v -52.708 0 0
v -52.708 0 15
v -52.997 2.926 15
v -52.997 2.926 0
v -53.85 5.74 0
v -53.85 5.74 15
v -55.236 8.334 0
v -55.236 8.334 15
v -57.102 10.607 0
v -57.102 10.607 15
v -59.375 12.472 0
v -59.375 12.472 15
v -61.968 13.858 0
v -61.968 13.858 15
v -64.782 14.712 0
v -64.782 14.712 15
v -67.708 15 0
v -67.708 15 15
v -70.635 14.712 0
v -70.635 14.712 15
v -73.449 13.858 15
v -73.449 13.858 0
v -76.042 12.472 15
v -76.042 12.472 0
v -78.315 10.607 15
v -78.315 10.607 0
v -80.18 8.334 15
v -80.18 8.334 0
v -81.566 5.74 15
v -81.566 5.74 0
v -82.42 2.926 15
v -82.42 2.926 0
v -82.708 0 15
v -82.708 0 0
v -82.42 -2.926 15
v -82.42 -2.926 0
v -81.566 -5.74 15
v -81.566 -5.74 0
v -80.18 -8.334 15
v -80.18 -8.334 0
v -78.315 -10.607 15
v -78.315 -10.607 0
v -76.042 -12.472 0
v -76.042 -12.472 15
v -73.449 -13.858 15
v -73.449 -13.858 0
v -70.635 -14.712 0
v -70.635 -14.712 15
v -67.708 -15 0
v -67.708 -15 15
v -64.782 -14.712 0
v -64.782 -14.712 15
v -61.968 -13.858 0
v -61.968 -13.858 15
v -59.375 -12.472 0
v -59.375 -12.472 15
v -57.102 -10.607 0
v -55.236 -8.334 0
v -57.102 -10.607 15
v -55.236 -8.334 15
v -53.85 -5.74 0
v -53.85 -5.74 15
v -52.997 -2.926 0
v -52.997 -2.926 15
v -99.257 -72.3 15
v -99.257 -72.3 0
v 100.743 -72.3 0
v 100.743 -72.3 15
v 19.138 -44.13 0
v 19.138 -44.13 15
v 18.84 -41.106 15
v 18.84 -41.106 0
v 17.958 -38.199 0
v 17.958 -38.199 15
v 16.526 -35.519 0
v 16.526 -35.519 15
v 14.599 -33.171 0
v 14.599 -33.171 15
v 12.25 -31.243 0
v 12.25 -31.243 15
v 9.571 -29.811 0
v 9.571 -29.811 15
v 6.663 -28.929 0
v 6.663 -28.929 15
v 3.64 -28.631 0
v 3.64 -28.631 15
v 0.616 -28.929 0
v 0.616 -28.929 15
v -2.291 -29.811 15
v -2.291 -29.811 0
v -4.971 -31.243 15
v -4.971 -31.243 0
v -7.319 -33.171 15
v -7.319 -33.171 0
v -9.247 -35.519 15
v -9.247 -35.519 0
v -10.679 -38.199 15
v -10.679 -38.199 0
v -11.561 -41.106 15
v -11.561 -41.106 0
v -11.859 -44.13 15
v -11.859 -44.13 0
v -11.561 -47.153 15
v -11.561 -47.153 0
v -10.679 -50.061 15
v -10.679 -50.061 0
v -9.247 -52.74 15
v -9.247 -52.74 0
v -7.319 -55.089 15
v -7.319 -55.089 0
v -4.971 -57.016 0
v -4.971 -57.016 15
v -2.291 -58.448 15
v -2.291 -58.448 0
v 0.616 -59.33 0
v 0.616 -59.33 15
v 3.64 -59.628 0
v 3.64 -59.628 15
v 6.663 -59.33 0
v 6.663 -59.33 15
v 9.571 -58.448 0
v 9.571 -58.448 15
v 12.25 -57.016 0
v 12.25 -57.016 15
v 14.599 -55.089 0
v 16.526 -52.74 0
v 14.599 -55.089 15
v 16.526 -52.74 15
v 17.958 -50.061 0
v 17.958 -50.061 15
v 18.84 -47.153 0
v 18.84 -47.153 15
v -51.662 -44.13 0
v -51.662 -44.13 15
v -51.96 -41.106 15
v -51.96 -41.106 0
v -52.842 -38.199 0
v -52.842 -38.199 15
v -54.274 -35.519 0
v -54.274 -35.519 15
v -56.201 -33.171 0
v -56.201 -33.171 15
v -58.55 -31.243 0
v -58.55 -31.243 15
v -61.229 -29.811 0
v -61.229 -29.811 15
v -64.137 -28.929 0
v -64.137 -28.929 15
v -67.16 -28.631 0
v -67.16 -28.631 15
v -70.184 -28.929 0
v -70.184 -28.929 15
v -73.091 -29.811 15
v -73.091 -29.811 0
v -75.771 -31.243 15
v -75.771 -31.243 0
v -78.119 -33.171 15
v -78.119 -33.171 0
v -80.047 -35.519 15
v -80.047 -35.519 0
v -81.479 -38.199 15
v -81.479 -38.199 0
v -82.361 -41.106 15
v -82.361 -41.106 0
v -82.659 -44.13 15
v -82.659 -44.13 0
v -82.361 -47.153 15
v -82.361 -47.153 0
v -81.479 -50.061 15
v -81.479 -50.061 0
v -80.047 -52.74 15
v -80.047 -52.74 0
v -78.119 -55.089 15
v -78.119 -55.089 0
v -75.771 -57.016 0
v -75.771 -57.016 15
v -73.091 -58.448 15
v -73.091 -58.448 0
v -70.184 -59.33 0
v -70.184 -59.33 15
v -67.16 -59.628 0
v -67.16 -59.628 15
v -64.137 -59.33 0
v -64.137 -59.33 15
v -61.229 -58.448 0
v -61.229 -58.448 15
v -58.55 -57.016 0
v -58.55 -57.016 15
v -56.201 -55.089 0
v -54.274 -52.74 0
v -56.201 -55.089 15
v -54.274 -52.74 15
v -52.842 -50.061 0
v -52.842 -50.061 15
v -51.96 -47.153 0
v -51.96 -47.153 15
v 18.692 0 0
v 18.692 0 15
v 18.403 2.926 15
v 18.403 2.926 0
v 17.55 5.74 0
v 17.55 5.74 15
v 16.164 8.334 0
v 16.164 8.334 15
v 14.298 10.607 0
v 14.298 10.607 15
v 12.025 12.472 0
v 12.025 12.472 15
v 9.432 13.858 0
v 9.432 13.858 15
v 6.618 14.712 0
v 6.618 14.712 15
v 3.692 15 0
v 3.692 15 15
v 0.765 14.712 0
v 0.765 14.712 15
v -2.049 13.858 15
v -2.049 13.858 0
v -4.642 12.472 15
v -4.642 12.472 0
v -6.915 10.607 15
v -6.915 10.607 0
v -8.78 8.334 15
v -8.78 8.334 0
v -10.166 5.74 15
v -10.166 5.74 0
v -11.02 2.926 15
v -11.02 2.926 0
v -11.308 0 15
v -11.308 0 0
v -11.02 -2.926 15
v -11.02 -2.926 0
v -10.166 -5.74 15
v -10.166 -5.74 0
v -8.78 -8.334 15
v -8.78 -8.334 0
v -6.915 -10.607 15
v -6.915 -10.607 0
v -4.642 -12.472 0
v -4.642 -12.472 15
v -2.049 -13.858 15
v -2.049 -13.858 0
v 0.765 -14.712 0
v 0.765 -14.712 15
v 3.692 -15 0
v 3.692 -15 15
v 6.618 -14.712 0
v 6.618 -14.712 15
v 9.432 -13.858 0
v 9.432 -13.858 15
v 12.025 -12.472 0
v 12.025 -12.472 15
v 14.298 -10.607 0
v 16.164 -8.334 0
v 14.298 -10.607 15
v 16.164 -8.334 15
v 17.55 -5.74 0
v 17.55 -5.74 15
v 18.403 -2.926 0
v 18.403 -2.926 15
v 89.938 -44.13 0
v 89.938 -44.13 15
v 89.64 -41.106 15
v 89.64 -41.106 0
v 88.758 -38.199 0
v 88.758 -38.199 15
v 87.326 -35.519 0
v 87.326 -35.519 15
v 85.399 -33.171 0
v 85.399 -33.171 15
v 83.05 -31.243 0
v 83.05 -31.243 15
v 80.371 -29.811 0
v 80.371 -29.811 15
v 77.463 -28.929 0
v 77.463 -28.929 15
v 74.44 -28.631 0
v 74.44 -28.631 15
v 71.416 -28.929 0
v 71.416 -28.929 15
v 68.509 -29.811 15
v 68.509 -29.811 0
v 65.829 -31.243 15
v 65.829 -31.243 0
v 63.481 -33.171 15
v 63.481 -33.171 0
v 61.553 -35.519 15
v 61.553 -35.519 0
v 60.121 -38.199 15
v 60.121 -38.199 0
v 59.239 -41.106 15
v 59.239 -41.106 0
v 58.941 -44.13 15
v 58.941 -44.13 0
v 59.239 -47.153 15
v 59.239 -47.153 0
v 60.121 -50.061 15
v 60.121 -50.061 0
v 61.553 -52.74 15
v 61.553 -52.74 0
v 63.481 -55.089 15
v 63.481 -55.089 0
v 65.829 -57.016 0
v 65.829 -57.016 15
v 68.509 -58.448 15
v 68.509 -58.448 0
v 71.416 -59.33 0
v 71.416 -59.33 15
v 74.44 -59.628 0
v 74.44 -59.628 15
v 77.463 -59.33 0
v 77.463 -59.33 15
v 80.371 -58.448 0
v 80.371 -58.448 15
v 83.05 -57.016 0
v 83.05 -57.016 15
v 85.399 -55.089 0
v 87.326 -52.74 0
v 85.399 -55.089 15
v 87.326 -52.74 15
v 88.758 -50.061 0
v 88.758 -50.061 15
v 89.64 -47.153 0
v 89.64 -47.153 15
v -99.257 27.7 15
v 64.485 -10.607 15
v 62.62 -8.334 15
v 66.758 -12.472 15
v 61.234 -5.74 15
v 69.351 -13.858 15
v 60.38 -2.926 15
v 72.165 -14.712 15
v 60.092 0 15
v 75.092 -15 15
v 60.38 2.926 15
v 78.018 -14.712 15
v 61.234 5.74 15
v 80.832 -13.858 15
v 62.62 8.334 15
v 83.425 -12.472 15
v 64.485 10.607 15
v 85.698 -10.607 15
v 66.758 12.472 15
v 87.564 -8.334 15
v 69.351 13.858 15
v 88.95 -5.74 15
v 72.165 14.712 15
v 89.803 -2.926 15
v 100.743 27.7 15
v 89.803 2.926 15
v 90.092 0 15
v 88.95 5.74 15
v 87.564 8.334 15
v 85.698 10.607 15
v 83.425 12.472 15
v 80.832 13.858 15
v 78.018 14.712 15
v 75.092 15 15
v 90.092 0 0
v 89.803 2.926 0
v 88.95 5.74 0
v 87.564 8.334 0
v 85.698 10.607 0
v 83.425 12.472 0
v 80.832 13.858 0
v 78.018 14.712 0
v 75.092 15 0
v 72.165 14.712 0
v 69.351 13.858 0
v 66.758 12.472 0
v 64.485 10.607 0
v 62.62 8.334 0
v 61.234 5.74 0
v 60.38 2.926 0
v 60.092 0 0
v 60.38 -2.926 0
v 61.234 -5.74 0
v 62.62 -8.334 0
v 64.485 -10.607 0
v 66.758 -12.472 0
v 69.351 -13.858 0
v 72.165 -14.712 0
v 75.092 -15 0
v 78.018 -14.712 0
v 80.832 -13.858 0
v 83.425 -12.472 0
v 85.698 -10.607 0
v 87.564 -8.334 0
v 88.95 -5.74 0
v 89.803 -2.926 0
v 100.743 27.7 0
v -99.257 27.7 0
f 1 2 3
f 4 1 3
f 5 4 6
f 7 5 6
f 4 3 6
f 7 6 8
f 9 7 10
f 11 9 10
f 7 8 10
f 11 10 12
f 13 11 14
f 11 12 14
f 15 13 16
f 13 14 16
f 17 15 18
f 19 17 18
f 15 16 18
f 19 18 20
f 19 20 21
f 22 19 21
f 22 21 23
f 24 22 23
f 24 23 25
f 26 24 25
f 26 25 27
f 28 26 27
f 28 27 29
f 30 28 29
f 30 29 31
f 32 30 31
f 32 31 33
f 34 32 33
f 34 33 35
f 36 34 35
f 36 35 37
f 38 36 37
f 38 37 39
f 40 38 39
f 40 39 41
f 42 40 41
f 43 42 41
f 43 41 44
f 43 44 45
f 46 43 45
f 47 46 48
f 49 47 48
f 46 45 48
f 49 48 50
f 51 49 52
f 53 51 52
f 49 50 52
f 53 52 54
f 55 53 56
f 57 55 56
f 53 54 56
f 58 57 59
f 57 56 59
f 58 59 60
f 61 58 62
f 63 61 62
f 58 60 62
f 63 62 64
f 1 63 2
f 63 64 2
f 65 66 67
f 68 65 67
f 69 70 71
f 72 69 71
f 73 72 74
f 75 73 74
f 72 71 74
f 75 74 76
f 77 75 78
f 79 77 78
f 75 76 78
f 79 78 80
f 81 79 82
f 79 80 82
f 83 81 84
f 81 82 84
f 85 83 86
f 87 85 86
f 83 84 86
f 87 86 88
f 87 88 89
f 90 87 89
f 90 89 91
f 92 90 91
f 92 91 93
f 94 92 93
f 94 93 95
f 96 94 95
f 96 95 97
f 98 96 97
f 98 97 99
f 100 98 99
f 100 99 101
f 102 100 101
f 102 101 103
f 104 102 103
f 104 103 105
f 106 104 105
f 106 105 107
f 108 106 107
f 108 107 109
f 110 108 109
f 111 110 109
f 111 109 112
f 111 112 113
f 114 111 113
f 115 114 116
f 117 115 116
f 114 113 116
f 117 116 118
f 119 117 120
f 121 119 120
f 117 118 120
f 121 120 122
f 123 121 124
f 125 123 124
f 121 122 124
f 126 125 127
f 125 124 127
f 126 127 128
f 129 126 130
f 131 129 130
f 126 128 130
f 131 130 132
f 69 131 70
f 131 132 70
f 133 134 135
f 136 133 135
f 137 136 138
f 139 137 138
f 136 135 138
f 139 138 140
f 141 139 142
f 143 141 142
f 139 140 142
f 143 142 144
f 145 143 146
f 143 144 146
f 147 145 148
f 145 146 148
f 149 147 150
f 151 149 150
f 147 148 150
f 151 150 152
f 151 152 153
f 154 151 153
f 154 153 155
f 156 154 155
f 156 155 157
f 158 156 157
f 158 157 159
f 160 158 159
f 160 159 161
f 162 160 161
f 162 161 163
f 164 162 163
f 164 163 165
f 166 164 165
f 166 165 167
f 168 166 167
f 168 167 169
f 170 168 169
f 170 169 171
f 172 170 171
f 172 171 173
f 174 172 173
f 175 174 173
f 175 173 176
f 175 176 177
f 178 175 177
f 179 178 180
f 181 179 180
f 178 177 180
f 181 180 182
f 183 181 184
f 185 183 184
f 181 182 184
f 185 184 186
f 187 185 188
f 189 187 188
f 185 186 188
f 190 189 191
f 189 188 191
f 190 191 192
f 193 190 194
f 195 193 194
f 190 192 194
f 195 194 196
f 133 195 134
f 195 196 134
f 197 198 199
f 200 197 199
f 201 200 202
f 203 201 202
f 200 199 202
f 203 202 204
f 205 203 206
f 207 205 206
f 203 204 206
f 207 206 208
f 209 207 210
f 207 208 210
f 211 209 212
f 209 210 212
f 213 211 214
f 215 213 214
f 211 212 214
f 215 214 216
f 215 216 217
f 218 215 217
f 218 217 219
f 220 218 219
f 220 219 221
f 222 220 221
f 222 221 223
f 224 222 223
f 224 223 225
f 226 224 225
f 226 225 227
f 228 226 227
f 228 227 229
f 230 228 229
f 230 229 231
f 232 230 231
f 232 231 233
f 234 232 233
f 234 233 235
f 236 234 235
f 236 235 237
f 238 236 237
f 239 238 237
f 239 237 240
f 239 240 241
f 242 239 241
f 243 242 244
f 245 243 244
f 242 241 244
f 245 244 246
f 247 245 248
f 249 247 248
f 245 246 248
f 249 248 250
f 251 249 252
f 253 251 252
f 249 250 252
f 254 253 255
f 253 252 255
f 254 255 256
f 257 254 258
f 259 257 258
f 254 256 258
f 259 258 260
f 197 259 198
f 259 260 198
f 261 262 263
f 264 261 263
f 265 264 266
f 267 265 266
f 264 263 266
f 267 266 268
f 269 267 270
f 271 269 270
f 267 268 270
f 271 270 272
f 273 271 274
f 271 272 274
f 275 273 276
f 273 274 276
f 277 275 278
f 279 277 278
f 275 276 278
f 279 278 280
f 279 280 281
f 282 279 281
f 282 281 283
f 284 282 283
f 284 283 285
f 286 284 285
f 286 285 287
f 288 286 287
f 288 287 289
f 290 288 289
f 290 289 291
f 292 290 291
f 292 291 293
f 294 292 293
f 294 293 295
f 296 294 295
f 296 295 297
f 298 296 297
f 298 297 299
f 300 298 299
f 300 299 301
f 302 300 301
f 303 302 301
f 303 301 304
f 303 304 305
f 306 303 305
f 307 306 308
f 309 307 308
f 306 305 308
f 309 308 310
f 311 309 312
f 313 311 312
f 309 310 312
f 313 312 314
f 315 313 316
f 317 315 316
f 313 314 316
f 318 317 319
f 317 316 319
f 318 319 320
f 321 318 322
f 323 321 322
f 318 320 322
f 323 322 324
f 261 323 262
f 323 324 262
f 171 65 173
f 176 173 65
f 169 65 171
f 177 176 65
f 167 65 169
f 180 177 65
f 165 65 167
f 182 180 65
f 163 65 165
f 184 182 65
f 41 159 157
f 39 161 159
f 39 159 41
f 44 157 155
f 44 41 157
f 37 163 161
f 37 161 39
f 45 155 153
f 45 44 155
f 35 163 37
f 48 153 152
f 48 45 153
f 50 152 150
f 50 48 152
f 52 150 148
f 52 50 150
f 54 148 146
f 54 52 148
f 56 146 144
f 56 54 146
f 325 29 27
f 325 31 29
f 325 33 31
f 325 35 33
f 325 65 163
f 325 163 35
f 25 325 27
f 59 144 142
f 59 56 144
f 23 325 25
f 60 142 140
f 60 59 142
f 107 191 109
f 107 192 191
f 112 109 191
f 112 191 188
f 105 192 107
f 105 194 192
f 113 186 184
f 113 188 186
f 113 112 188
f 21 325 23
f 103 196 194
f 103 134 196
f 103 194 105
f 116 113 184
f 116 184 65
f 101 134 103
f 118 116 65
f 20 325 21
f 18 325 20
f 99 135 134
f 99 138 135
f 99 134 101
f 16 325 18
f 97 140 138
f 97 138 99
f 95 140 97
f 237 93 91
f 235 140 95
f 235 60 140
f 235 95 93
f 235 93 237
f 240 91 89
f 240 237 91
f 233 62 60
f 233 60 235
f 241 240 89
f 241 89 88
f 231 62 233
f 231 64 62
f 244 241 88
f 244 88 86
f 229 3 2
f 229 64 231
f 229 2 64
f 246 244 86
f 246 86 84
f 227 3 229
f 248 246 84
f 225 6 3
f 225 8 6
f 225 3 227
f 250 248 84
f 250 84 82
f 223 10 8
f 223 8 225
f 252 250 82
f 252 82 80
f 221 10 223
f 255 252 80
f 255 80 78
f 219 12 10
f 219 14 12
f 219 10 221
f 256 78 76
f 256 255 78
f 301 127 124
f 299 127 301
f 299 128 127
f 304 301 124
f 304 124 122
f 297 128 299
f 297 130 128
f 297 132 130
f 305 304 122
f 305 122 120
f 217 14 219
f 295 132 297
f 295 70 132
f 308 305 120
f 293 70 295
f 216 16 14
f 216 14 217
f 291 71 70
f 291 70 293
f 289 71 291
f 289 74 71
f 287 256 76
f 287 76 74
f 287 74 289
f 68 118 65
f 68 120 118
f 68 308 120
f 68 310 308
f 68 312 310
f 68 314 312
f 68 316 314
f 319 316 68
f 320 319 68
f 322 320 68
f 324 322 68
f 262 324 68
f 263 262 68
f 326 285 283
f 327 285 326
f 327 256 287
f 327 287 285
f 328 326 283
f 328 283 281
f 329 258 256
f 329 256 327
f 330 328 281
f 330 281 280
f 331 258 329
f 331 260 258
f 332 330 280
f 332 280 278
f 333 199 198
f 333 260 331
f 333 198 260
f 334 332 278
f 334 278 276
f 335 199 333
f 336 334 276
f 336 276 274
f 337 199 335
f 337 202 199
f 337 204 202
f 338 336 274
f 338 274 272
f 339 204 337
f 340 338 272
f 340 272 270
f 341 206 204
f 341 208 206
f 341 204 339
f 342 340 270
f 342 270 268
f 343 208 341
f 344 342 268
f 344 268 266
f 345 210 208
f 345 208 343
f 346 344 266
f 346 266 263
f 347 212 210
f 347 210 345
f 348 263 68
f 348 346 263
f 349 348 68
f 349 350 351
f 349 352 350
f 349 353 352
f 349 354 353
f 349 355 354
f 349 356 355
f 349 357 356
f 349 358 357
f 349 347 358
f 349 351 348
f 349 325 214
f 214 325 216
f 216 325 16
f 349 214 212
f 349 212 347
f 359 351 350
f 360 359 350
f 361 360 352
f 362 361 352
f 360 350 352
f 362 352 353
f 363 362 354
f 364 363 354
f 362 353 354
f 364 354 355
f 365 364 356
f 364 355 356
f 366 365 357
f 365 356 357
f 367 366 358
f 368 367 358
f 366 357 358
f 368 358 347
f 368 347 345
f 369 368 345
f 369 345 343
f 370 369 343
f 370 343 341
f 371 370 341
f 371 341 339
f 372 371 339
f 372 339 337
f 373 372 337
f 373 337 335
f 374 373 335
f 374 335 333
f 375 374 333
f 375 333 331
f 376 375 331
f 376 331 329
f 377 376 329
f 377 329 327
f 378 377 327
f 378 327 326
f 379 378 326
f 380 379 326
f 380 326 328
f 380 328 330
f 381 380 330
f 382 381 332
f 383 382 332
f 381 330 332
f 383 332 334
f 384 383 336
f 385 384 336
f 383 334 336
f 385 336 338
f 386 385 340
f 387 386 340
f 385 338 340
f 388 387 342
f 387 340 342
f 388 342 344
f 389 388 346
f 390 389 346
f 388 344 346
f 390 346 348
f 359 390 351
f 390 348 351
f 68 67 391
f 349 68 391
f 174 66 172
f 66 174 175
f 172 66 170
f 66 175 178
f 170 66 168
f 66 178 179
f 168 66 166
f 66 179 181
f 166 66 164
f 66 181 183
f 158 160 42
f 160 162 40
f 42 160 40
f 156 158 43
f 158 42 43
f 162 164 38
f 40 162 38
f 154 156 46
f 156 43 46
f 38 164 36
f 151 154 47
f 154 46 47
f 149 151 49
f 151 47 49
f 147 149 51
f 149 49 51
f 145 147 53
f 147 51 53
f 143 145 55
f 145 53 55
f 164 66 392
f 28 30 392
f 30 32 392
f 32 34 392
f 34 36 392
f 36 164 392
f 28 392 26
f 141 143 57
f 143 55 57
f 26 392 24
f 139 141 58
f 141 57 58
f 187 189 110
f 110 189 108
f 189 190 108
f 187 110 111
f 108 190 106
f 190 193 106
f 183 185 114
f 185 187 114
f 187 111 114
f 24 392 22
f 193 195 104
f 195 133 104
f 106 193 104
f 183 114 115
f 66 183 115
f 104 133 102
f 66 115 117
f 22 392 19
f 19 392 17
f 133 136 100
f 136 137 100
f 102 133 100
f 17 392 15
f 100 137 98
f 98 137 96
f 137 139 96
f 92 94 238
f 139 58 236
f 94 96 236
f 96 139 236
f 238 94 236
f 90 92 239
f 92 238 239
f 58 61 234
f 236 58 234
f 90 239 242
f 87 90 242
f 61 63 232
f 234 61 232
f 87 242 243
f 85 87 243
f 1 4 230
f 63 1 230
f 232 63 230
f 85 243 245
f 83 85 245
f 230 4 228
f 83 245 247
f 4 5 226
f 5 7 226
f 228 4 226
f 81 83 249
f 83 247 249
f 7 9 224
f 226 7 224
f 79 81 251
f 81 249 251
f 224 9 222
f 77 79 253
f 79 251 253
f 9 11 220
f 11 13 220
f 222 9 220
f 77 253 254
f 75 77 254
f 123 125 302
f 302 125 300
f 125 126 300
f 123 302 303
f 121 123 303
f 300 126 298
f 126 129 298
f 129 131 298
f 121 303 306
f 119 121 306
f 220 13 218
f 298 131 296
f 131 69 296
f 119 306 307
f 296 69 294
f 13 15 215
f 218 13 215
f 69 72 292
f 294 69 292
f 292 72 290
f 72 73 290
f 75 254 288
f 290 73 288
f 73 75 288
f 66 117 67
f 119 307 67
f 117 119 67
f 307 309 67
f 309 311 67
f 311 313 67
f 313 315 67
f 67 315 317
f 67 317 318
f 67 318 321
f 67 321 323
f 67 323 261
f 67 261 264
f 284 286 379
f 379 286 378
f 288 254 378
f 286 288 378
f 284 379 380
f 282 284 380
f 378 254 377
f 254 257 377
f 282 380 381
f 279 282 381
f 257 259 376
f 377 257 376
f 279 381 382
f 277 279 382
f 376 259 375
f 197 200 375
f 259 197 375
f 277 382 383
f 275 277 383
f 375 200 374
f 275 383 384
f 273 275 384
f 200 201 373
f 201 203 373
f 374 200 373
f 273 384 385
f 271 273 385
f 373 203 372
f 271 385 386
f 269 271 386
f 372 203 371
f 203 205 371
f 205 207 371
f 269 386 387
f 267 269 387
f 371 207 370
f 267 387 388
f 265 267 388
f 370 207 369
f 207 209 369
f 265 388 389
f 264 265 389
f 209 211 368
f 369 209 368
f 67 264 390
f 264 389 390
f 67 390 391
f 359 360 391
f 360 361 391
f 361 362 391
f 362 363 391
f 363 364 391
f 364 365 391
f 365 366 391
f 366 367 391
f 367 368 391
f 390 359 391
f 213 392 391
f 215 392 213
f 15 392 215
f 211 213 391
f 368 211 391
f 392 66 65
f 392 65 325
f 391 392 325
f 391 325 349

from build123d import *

# Parameters (mm, degrees)
F0_W     = 200
F0_H     = 100
F1_DEPTH = 15
F2_R     = 15
F3_DEPTH = 15.001
F4_R     = 15.498481
F5_DEPTH = 15.001
F6_DEPTH = 15.001


with BuildPart() as f1:
    # F0 (on Top) → F1 (new body)
    with BuildSketch(Plane.XY):
        with Locations((0.742927, -22.300308)):
            Rectangle(F0_W, F0_H)
    extrude(amount=F1_DEPTH)

    # F2 (on face) → F3 (cut, through all)
    with BuildSketch(Plane.XY.offset(15)):
        with Locations((-67.708292, 0)):
            Circle(F2_R)
        with Locations((3.691708, 0)):
            Circle(F2_R)
        with Locations((75.091708, 0)):
            Circle(F2_R)
    extrude(amount=-F3_DEPTH, mode=Mode.SUBTRACT)

    # F4 (on face) → F5 (cut, through all)
    with BuildSketch(Plane.XY.offset(15)):
        with Locations((-67.160375, -44.129718)):
            Circle(F4_R)
    extrude(amount=-F5_DEPTH, mode=Mode.SUBTRACT)

    # F4 (on face) → F6 (cut, through all)
    with BuildSketch(Plane.XY.offset(15)):
        with Locations((-67.160375, -44.129718)):
            Circle(F4_R)
        with Locations((3.639625, -44.129718)):
            Circle(F4_R)
        with Locations((74.439625, -44.129718)):
            Circle(F4_R)
    extrude(amount=-F6_DEPTH, mode=Mode.SUBTRACT)


solid = f1.part
